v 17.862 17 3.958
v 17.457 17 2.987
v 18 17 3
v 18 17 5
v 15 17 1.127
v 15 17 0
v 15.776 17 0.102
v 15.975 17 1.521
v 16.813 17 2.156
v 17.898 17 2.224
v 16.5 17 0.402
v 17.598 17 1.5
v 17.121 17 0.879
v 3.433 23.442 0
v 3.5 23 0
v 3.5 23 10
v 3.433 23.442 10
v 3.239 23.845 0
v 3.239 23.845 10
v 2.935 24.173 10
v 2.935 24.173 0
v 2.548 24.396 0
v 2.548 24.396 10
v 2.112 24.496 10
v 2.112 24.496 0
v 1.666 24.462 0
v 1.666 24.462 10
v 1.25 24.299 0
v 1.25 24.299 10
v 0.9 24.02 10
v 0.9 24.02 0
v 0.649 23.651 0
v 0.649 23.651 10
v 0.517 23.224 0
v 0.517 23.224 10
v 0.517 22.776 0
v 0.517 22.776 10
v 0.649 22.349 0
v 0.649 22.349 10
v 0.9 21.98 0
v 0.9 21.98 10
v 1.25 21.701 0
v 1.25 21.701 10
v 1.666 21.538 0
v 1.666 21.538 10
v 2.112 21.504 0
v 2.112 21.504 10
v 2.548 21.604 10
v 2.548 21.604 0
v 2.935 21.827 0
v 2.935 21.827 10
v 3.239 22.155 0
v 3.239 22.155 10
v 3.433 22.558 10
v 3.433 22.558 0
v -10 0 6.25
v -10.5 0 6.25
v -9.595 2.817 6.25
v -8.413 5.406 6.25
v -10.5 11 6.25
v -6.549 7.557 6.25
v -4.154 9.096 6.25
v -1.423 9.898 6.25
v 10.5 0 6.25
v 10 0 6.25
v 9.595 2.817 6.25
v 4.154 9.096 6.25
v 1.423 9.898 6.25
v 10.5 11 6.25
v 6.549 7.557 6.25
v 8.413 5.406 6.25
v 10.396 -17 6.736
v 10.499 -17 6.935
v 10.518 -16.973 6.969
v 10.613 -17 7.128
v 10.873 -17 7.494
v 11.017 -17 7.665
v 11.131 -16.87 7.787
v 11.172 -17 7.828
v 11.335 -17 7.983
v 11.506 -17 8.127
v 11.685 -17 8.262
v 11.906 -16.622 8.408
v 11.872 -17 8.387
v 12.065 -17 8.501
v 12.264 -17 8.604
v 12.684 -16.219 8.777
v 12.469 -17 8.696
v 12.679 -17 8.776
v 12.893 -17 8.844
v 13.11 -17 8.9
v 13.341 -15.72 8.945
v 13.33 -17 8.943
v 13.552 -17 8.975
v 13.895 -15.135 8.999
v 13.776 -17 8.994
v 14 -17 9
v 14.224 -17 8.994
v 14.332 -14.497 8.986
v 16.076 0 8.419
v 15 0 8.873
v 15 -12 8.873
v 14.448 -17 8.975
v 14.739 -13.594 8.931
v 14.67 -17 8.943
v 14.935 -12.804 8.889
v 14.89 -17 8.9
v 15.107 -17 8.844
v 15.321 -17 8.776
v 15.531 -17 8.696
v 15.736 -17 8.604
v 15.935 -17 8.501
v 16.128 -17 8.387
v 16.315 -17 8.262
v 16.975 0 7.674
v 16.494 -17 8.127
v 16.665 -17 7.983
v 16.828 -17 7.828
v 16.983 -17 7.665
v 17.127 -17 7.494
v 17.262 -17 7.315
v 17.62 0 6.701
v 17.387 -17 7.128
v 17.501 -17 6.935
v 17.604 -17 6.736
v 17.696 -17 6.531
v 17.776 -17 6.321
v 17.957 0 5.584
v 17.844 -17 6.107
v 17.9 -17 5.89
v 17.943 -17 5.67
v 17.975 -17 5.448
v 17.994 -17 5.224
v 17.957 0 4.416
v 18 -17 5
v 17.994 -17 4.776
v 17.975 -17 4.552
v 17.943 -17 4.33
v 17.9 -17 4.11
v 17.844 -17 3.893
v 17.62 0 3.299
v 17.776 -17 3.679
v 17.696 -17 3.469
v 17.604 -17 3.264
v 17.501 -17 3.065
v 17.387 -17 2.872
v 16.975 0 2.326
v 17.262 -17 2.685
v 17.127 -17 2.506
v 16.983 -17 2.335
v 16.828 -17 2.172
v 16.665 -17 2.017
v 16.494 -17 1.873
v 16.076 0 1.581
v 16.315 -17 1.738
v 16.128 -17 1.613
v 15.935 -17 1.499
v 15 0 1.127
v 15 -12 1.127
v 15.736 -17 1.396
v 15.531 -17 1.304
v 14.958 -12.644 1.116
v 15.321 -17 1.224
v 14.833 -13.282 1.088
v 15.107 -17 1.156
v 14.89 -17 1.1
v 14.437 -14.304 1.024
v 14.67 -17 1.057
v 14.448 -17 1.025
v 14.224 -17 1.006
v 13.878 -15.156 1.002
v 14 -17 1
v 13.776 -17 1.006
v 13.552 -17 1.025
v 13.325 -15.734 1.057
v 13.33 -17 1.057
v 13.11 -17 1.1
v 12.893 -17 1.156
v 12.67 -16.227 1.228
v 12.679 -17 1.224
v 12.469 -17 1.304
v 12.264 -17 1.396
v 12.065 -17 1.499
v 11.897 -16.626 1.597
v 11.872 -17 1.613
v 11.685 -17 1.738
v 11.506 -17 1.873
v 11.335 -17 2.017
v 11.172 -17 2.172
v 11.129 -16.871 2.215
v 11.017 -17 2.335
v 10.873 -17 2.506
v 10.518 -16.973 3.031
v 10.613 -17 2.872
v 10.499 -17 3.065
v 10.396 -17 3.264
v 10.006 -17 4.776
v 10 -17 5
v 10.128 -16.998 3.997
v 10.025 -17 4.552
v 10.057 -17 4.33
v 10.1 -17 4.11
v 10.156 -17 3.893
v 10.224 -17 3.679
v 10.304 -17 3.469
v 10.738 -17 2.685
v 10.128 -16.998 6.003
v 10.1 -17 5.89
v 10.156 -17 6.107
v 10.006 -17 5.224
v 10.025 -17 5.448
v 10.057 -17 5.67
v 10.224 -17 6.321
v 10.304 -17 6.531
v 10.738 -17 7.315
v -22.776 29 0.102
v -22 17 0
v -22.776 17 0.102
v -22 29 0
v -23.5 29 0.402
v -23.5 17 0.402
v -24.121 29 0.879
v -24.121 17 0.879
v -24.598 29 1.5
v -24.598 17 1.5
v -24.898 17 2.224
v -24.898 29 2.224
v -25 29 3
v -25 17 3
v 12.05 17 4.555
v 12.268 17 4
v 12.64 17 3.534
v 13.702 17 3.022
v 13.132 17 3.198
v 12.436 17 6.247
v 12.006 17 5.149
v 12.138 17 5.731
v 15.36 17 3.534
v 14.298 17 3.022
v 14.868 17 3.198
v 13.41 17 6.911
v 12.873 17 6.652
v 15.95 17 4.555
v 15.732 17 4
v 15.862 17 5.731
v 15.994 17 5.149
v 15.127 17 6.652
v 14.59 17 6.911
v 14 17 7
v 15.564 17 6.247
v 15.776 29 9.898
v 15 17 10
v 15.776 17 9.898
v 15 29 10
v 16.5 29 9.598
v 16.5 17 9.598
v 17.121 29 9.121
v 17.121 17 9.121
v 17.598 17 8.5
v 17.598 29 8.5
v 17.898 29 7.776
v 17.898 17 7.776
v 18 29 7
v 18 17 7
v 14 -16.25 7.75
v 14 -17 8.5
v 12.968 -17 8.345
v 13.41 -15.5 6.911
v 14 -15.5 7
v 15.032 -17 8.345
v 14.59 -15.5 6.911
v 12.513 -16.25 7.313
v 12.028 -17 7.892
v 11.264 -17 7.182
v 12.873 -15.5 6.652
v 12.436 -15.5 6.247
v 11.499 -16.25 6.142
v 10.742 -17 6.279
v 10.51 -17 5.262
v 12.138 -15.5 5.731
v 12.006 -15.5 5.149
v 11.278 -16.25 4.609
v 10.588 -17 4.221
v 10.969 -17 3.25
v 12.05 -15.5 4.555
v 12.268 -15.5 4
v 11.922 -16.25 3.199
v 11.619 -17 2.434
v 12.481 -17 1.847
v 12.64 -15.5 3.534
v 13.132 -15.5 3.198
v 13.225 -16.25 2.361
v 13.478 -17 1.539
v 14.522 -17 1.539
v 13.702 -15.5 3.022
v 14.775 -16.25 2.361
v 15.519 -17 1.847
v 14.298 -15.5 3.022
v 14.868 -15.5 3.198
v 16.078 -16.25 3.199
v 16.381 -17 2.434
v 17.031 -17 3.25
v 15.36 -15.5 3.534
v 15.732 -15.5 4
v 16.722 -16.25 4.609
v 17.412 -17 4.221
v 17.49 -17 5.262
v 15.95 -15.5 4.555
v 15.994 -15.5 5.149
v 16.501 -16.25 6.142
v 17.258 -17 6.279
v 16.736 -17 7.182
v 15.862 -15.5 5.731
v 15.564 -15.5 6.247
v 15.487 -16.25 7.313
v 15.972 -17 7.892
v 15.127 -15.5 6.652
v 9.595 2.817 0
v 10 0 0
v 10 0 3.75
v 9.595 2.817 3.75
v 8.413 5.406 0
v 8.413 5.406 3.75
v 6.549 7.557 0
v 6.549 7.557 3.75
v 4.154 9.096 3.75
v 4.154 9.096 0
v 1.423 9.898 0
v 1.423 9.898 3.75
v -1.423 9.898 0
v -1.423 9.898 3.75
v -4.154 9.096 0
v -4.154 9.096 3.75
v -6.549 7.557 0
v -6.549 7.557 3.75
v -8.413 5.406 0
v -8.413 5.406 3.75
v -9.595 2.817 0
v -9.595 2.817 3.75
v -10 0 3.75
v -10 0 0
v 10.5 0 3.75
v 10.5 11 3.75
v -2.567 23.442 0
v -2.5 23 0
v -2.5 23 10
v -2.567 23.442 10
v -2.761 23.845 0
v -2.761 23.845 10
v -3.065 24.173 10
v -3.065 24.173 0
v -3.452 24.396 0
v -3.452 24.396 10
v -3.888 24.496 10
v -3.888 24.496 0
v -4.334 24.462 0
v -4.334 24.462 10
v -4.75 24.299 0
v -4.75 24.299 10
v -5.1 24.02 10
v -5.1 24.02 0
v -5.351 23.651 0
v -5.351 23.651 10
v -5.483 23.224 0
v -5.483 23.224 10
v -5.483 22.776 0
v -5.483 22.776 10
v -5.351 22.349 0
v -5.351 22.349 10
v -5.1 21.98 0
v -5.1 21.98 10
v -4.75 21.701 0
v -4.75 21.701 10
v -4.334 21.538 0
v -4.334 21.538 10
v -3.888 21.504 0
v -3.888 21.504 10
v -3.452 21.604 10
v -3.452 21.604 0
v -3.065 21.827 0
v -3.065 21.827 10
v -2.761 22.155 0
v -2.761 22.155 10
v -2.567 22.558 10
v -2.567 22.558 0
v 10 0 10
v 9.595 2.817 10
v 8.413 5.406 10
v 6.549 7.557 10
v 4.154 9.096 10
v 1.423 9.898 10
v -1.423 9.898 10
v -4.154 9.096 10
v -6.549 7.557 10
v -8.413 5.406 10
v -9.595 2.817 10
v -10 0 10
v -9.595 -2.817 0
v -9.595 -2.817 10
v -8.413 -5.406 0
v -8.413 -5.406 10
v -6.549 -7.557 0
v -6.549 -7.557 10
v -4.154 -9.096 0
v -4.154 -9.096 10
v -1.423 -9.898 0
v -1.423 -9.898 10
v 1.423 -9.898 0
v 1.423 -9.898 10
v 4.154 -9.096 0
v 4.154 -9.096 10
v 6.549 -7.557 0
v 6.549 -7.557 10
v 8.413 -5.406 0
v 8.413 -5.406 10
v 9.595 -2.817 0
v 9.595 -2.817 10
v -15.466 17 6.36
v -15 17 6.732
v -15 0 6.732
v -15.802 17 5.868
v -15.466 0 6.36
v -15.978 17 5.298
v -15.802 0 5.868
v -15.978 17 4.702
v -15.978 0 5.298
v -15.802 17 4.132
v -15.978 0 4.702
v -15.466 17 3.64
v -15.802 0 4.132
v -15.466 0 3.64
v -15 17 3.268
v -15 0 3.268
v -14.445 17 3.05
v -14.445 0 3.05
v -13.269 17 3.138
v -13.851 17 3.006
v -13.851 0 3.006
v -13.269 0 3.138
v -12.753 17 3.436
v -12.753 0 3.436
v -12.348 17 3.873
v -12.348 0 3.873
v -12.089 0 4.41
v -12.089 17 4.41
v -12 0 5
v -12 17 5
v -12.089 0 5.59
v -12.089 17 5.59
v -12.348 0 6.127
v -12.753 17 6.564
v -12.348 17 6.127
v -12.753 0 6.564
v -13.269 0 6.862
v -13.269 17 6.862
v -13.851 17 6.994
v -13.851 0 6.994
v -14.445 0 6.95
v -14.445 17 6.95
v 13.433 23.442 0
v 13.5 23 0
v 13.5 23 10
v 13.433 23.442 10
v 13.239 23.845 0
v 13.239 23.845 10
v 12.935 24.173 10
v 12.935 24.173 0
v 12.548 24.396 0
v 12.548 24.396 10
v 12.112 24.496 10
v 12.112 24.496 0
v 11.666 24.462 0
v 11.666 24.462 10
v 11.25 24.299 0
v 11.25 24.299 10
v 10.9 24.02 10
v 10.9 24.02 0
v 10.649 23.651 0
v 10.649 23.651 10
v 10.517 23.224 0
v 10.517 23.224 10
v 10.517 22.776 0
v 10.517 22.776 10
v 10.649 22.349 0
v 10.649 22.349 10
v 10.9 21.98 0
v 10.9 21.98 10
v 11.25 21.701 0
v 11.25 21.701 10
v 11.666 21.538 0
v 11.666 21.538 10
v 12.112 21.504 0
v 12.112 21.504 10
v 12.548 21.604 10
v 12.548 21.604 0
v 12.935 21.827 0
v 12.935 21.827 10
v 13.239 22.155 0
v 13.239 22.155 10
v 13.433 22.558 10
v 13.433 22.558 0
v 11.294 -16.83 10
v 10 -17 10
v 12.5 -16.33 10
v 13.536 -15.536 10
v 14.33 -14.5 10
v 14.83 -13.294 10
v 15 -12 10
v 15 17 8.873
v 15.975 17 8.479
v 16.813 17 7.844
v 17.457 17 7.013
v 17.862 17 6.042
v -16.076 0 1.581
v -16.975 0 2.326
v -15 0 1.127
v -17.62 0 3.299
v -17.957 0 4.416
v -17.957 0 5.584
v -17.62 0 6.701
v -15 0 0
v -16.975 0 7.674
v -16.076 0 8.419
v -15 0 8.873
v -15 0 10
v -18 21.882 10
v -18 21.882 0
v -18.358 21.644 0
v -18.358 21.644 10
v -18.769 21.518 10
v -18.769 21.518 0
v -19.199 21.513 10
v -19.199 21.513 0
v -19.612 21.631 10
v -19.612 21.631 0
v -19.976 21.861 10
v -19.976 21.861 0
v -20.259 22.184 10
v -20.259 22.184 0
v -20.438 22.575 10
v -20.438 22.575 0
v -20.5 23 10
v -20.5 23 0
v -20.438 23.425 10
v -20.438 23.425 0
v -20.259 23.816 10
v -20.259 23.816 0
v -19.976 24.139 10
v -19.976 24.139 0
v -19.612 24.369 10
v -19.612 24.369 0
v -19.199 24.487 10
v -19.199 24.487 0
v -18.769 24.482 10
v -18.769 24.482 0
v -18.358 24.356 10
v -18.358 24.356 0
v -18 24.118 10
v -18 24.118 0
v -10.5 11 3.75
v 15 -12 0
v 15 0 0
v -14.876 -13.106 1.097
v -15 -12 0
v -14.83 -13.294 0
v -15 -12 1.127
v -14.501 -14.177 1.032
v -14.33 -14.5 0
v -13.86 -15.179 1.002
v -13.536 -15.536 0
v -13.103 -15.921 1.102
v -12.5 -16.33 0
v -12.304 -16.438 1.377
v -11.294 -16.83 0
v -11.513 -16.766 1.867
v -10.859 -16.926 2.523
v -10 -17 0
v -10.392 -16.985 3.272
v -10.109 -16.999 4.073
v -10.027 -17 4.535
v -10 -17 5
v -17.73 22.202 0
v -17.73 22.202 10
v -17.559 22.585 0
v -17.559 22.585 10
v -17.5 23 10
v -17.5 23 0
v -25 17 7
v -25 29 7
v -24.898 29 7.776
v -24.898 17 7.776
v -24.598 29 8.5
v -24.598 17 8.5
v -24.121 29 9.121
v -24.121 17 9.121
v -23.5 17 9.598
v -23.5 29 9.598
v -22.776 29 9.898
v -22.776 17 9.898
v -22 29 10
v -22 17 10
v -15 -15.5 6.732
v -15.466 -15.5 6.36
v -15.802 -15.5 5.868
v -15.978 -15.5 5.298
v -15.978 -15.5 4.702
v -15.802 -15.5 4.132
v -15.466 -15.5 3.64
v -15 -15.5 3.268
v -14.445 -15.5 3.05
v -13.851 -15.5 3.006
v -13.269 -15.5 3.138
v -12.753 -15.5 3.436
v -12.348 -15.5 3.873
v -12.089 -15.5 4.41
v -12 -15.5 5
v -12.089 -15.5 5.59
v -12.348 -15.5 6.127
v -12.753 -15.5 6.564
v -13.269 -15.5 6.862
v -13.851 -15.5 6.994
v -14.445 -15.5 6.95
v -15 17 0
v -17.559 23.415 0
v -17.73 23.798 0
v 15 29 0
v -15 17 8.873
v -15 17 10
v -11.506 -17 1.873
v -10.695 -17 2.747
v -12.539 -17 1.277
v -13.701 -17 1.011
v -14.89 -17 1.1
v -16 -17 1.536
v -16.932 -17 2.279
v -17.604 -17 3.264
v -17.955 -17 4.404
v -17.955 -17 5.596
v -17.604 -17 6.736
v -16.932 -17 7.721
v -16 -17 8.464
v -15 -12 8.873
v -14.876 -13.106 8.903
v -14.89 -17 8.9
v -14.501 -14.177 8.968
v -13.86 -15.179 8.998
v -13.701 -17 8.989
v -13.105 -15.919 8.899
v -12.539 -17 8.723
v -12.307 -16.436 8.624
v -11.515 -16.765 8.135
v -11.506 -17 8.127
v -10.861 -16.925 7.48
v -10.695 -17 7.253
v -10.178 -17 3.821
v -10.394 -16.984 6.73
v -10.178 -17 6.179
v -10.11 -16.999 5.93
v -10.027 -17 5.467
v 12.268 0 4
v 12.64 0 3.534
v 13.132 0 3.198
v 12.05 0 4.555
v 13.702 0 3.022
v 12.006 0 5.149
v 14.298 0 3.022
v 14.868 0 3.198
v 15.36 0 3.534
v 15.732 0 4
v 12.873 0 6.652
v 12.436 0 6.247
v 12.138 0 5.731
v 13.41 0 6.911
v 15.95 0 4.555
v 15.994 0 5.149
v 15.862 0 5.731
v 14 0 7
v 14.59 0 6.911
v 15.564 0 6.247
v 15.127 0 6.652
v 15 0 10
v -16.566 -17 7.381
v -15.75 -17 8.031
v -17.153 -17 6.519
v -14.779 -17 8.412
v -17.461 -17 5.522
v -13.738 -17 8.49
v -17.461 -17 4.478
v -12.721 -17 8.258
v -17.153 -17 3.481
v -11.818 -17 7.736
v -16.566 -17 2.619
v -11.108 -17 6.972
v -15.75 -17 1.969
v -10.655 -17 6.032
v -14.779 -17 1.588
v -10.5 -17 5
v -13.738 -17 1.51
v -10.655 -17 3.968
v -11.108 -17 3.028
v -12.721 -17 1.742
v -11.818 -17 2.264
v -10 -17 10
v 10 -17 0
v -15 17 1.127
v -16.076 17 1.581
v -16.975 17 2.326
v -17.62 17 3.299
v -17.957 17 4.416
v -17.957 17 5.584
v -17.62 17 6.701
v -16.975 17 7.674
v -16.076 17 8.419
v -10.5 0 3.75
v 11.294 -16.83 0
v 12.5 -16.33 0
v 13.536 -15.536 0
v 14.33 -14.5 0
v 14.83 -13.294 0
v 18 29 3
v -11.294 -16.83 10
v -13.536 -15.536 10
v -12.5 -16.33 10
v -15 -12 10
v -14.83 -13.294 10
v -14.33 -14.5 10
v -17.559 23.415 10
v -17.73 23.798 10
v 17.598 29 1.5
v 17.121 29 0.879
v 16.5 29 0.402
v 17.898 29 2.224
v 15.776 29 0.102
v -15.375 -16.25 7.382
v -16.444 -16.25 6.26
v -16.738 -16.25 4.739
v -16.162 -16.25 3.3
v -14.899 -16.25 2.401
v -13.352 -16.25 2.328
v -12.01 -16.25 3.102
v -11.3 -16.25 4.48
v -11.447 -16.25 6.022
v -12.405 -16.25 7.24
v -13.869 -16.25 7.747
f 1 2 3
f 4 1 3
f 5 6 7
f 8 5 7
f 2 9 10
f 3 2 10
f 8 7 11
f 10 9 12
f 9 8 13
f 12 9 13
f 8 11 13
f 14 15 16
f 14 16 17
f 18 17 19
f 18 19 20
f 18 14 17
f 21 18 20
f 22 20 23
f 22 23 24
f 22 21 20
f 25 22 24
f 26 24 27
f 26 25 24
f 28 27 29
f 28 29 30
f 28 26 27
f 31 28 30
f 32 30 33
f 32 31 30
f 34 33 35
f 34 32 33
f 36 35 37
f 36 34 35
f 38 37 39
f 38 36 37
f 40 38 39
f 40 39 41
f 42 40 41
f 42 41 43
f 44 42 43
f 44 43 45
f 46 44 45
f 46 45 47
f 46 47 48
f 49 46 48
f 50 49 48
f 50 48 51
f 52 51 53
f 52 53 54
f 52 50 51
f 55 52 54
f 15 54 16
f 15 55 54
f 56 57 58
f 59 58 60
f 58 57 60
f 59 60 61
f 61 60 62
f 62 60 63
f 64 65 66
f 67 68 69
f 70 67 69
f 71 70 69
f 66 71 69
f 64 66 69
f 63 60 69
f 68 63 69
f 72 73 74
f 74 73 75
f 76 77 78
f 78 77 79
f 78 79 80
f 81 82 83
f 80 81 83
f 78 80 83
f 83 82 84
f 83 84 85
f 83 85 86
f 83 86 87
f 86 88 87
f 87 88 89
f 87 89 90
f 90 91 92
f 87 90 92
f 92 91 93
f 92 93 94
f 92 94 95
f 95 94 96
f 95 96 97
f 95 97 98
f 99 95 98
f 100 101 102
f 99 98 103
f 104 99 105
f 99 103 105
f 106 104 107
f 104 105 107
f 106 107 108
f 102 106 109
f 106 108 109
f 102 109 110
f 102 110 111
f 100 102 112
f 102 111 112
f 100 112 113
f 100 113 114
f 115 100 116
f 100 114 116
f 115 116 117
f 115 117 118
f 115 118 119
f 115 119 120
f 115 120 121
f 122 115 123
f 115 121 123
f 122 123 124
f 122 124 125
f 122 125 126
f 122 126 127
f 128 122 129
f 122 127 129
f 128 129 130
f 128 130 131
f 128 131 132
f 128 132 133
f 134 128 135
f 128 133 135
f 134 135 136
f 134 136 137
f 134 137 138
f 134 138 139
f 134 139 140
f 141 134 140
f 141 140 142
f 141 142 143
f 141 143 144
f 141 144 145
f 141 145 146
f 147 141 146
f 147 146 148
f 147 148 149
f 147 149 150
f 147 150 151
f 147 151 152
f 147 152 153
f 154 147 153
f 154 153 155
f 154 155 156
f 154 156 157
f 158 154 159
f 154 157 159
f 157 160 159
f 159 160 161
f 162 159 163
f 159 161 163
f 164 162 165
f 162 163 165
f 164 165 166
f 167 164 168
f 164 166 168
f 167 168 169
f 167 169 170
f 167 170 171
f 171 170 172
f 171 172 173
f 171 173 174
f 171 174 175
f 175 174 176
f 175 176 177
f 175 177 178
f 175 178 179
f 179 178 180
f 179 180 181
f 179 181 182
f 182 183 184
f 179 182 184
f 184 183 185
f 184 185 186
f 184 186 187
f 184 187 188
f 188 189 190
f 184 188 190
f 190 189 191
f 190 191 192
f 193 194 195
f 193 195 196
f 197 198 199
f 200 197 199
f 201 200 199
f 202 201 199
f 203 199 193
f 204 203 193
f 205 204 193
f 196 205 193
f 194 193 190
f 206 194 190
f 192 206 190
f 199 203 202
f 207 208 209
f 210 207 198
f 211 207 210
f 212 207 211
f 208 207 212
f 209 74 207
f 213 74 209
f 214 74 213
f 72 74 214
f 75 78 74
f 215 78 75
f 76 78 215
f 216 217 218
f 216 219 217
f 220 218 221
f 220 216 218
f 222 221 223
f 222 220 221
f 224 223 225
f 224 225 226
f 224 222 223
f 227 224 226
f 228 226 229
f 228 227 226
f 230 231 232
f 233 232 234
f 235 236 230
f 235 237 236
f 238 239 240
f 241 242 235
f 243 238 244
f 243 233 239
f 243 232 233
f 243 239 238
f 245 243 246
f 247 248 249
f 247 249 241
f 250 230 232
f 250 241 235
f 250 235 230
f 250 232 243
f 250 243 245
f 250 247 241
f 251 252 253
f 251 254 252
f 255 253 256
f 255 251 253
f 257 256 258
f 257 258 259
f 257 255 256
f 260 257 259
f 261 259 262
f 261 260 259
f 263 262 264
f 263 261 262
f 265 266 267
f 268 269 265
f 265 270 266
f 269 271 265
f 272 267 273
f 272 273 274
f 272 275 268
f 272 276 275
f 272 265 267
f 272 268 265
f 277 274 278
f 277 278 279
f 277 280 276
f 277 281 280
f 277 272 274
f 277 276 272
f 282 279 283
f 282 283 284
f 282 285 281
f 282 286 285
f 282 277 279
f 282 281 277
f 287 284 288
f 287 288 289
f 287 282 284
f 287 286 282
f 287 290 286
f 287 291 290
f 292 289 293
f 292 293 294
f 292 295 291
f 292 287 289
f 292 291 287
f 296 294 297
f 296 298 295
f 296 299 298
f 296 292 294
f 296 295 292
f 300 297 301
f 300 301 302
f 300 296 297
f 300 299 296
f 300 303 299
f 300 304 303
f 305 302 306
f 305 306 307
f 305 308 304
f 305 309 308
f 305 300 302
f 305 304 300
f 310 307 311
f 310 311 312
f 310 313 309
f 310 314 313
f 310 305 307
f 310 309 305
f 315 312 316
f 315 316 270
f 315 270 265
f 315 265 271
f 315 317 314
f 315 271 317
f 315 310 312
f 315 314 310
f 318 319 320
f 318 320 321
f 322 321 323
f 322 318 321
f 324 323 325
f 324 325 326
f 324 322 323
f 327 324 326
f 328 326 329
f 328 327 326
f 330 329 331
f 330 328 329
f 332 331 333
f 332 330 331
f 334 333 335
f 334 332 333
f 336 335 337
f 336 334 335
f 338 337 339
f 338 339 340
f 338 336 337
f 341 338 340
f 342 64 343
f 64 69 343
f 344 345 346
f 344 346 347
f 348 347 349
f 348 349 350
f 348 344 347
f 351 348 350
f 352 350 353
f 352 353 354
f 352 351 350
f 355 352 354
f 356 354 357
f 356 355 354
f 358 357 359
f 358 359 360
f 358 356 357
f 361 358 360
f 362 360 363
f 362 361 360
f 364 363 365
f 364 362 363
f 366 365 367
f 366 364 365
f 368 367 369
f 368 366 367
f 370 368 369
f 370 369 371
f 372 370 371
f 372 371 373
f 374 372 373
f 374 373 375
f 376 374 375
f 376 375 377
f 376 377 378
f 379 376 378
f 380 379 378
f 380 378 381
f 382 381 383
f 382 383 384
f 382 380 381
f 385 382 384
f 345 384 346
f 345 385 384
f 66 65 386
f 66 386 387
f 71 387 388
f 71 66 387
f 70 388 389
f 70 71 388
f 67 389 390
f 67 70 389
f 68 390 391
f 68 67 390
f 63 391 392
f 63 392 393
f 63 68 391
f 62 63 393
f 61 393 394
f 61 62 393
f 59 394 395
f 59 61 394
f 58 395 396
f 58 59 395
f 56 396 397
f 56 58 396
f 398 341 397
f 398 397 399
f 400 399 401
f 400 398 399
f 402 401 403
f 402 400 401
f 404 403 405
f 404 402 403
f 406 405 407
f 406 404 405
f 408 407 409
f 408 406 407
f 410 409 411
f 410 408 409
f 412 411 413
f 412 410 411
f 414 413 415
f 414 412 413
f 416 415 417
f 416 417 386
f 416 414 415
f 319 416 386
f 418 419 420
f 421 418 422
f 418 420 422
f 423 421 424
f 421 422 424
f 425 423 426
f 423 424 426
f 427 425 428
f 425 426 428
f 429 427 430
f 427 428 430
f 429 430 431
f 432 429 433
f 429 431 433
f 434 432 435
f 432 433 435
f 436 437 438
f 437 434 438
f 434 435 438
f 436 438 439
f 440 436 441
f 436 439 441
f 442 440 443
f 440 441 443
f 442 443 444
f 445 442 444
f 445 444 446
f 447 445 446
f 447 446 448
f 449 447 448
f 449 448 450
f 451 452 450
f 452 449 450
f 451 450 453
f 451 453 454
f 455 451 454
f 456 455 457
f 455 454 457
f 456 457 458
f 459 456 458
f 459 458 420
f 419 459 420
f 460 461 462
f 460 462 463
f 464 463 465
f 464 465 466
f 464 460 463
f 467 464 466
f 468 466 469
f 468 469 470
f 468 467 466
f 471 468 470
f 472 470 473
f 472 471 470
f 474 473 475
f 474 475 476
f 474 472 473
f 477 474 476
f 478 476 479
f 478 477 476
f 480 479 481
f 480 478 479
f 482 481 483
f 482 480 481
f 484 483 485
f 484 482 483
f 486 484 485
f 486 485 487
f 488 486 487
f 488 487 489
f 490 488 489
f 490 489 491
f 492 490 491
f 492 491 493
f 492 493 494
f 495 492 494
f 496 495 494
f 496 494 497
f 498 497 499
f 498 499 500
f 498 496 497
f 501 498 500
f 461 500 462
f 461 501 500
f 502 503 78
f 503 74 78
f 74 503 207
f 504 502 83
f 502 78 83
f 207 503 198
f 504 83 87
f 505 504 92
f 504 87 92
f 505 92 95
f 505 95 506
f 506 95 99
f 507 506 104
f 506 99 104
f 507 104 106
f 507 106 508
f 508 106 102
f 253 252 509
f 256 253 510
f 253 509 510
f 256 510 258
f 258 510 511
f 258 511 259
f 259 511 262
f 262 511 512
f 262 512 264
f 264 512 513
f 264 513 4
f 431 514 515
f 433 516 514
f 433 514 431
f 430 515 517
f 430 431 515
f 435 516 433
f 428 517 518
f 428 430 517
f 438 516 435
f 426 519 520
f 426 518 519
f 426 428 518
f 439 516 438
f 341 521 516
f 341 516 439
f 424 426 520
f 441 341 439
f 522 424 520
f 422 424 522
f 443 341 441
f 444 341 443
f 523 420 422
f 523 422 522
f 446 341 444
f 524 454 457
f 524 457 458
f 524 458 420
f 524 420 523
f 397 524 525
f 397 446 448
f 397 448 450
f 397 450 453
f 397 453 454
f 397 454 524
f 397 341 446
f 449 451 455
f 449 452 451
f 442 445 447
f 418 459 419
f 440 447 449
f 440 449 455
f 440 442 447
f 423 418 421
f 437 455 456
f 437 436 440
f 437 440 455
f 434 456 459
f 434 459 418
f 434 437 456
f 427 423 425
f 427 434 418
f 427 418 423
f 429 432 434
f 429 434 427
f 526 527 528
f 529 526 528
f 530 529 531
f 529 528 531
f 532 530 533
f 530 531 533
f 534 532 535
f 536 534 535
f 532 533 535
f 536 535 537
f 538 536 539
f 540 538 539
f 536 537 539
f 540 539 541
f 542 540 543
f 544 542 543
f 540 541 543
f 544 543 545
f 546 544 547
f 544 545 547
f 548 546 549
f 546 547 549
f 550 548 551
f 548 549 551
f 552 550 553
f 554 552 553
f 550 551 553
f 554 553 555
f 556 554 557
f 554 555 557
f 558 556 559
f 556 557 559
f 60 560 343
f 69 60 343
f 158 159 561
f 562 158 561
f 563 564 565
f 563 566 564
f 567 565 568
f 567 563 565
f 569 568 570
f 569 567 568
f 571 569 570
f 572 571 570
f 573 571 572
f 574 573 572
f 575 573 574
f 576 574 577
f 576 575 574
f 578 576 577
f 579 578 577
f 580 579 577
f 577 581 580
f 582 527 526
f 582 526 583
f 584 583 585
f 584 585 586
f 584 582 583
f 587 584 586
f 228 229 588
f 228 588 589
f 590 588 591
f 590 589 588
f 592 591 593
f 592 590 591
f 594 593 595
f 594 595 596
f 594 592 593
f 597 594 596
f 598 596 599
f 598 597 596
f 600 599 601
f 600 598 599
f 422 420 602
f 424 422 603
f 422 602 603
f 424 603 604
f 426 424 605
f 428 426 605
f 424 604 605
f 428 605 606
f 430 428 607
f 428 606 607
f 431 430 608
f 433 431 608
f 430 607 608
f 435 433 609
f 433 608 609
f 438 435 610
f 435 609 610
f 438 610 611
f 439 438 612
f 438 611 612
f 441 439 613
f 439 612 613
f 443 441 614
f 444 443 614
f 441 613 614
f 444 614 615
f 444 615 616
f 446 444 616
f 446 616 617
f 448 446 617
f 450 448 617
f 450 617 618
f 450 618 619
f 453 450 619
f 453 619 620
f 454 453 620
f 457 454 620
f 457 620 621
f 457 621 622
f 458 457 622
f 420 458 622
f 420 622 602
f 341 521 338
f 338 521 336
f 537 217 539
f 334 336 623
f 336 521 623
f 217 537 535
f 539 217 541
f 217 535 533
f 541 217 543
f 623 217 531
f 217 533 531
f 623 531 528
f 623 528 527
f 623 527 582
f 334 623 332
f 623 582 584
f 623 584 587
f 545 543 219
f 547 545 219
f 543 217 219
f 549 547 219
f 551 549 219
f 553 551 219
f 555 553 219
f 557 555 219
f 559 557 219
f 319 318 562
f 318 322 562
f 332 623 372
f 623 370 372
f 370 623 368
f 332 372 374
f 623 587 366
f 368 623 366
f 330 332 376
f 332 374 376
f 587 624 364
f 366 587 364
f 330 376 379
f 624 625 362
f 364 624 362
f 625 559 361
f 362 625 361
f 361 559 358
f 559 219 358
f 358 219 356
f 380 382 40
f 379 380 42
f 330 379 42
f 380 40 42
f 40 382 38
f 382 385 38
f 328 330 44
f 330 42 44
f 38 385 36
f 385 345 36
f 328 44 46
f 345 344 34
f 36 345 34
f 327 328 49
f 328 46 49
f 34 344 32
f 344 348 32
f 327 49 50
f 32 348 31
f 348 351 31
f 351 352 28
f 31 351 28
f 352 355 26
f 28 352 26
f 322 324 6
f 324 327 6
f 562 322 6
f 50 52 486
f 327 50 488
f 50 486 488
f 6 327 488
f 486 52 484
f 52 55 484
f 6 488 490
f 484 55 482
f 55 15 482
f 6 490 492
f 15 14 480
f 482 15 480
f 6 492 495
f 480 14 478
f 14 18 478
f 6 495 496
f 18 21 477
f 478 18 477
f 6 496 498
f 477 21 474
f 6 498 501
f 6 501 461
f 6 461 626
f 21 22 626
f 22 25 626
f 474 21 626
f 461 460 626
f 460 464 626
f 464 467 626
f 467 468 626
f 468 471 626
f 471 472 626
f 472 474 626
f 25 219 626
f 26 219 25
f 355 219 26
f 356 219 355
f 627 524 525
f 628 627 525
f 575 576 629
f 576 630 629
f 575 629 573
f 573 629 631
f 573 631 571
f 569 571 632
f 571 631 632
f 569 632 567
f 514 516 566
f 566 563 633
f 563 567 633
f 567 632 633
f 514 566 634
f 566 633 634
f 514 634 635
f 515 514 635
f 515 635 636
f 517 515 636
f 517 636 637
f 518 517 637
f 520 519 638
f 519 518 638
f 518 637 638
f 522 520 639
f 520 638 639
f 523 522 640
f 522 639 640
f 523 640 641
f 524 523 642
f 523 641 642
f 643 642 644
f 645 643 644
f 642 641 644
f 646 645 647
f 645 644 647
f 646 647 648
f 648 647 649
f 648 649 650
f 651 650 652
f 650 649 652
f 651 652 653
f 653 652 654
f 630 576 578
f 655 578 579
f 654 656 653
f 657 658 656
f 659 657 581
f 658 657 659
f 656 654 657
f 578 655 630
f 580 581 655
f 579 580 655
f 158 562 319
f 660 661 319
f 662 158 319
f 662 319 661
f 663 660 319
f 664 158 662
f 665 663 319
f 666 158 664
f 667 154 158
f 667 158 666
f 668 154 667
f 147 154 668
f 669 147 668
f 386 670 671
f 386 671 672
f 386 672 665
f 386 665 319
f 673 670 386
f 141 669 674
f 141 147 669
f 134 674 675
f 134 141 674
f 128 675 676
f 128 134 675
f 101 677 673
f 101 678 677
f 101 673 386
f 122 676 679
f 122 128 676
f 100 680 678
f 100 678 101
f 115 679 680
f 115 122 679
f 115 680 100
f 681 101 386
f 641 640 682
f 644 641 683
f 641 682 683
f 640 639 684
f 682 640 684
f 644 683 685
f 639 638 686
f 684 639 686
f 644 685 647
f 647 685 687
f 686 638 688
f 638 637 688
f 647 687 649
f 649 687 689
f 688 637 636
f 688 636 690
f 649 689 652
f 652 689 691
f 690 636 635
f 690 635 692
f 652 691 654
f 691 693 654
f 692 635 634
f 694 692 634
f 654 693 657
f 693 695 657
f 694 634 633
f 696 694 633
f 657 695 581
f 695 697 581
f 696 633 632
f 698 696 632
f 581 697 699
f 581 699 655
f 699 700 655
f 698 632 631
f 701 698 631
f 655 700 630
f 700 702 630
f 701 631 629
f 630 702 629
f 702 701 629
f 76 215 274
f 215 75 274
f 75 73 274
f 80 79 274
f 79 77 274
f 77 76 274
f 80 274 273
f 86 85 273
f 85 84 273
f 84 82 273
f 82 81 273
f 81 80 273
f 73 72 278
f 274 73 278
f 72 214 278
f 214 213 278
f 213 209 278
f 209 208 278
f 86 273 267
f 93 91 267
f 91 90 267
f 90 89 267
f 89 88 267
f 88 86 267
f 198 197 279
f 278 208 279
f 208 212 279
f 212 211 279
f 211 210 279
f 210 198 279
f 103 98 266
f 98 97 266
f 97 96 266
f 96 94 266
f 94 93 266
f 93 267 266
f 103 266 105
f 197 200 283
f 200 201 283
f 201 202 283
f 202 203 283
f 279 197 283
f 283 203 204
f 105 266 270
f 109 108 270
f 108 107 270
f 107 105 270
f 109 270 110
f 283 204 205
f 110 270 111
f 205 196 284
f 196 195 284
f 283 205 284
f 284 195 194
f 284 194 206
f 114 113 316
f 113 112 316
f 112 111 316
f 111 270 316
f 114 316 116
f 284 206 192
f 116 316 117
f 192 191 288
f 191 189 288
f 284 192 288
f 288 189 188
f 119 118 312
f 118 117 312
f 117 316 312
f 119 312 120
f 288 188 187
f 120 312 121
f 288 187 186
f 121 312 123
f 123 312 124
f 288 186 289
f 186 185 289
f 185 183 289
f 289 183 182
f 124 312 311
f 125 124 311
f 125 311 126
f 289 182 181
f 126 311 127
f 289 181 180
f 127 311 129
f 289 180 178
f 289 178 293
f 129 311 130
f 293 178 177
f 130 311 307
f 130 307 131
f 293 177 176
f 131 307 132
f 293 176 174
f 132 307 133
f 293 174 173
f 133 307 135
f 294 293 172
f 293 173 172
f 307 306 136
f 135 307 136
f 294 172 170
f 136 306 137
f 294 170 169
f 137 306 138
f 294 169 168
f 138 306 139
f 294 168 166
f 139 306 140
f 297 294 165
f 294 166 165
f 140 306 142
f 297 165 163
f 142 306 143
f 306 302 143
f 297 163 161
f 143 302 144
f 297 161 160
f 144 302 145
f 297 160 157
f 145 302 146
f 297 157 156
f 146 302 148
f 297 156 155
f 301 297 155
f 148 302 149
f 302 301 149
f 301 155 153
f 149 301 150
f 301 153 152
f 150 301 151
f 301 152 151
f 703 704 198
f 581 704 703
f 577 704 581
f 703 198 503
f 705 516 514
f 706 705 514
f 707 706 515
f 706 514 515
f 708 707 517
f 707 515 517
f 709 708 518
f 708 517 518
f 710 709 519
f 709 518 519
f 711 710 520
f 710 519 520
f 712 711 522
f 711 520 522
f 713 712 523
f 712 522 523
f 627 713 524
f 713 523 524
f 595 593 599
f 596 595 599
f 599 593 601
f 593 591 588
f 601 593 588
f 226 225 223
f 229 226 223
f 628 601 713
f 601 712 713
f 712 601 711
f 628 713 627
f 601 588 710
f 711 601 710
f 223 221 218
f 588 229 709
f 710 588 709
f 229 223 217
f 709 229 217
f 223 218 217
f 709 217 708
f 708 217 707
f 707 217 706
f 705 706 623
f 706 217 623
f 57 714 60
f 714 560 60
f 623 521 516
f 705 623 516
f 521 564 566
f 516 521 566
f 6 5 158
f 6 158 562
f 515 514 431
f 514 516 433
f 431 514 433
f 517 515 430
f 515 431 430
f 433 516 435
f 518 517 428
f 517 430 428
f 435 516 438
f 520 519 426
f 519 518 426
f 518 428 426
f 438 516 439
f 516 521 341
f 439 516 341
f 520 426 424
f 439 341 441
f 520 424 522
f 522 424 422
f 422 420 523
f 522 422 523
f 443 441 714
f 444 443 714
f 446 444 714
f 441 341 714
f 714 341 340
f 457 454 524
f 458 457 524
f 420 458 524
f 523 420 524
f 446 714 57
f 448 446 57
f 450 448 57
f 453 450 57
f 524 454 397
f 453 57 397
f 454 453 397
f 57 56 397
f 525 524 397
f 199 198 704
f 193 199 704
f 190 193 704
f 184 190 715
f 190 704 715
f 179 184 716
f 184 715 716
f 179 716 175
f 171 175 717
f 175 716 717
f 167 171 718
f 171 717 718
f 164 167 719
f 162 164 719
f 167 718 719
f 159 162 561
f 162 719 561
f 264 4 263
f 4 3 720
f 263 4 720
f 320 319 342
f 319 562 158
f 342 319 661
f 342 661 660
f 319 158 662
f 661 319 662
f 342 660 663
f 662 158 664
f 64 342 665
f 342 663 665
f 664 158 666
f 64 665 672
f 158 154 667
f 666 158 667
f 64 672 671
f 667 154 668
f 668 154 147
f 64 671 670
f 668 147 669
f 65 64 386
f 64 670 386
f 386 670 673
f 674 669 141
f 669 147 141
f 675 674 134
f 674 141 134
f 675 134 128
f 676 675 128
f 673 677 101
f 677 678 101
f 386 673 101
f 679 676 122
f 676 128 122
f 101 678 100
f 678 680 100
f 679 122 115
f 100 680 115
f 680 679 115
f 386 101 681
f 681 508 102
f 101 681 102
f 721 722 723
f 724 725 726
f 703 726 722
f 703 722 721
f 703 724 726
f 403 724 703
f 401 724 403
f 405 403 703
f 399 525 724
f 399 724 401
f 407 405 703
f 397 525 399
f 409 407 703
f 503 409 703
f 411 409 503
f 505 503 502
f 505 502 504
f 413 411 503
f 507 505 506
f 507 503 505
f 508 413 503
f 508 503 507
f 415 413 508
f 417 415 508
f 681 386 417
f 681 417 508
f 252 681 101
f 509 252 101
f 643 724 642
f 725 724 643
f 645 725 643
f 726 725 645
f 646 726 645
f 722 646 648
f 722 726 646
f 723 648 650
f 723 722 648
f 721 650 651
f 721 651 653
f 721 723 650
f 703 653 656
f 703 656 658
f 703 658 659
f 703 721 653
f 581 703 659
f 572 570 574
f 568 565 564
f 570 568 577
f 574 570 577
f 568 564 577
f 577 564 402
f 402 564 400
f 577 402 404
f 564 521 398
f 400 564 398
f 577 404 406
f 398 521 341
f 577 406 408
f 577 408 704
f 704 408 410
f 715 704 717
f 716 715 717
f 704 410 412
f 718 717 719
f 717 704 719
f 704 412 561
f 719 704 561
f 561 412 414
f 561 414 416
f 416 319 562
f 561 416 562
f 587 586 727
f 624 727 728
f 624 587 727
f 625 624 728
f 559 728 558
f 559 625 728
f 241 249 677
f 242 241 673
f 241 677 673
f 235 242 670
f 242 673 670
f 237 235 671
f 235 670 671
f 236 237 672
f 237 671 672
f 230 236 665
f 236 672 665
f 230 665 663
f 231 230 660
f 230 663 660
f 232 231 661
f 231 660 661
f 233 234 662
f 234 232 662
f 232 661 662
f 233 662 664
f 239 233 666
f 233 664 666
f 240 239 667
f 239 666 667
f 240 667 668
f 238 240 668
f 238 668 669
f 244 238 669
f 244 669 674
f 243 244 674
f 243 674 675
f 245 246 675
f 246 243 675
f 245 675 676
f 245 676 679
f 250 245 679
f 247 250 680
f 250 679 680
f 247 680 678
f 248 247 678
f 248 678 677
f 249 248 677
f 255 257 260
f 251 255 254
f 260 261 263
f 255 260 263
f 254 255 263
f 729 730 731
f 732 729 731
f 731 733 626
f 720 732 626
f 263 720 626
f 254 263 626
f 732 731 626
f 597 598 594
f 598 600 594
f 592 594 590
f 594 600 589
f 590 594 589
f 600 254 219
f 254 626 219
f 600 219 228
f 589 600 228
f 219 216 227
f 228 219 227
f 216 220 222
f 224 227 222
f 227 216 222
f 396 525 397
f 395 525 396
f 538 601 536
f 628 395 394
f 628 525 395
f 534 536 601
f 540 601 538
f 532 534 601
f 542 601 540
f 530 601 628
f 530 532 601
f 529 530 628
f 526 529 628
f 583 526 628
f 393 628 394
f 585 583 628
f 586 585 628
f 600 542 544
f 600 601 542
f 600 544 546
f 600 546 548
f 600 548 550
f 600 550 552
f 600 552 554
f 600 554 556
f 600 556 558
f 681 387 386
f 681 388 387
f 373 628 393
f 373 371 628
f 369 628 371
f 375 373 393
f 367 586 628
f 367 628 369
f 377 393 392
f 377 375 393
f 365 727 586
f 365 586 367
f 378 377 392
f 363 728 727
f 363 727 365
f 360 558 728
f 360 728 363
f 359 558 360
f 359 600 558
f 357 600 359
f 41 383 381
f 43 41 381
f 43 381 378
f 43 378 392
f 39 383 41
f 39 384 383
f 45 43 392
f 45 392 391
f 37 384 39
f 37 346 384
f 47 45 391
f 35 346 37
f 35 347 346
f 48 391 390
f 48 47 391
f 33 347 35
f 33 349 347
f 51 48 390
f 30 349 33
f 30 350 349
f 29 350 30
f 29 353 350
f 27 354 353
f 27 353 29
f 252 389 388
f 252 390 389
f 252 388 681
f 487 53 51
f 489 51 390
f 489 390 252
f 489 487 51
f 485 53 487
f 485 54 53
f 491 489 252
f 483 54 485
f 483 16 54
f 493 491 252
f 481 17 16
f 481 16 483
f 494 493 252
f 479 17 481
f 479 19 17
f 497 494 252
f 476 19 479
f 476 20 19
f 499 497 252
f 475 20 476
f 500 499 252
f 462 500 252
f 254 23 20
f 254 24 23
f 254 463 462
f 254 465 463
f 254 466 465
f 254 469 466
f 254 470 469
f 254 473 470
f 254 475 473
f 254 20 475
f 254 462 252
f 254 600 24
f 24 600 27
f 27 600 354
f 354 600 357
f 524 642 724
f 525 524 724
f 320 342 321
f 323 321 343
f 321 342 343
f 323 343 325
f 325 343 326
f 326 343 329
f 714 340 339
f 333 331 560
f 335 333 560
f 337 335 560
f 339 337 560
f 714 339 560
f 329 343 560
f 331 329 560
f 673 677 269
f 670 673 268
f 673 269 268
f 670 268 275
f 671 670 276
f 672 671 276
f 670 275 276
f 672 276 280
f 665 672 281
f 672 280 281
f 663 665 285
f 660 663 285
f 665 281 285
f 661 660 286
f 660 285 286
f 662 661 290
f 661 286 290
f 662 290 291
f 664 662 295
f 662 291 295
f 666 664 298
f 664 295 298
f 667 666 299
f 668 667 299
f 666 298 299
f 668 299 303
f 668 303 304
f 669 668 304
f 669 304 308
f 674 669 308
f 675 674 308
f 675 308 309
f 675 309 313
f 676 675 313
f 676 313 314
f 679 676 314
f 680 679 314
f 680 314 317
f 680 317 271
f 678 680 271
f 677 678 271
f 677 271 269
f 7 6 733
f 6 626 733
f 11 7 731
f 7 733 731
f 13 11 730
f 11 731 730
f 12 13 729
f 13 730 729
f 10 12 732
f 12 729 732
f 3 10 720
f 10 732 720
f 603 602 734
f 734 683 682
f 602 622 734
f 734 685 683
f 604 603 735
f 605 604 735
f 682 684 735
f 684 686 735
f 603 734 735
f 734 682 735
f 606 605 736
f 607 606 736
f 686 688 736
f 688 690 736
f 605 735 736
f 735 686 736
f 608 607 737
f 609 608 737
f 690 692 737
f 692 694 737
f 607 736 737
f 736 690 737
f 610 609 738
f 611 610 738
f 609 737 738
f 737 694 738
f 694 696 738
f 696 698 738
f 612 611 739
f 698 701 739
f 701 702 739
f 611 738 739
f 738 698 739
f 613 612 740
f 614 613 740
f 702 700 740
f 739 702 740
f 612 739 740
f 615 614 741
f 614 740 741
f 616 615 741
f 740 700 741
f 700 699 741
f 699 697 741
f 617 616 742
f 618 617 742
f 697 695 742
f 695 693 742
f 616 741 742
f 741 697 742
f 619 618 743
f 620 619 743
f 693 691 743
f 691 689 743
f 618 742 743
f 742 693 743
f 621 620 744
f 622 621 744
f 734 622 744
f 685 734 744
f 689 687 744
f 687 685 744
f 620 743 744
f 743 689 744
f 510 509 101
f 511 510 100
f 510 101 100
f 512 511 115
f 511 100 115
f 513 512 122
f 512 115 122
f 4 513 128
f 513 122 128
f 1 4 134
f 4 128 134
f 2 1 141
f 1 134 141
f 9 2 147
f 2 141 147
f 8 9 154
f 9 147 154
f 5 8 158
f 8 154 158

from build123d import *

# Parameters (mm, degrees)
SKETCH1_R           = 10.000000000000004
SKETCH1_R_2         = 1.5000000000000007
SKETCH1_R_3         = 1.5000000000000027
SKETCH1_R_4         = 1.5000000000000024
BOSS_EXTRUDE1_DEPTH = 10
CUT_EXTRUDE1_DEPTH  = 34
CUT_EXTRUDE3_START  = 20
SKETCH3_W           = 0.5
SKETCH3_H           = 2.499999999999996
CUT_EXTRUDE3_DEPTH  = 10
CUT_EXTRUDE4_START  = 20
SKETCH3_3_W         = 0.5
SKETCH3_3_H         = 2.499999999999996
CUT_EXTRUDE4_DEPTH  = 1
FILLET1_R           = 5
CHAMFER1_SIZE       = 1.5
BOSS_EXTRUDE2_REACH = 37.567
SKETCH5_W           = 36
SKETCH5_H           = 12.000000000000004
SKETCH5_R           = 1.5000000000000024
SKETCH5_R_2         = 1.500000000000002
SKETCH5_R_3         = 1.5
CUT_EXTRUDE6_DEPTH  = 12
BOSS_EXTRUDE3_START = -10
SKETCH7_R           = 1.5000000000000215
BOSS_EXTRUDE3_DEPTH = 10
CUT_EXTRUDE7_START  = -10
SKETCH8_R           = 1.5000000000000042
SKETCH8_W           = 26.999999999999982
SKETCH8_H           = 12.000000000000004
CUT_EXTRUDE7_DEPTH  = 10
FILLET2_R           = 3


with BuildPart() as part:
    # Sketch1 → Boss-Extrude1 (new body)
    with BuildSketch(Plane.XY):
        with BuildLine():
            ThreePointArc((7.0000000000000355, 26.31662479035534), (3.3722813232688944, 28.84096258931757), (-1.0000000000002711, 28.196152422706483))
            ThreePointArc((-1.0000000000002185, 28.196152422706756), (-7.000000000000114, 28.19615242270657), (-10.000000000000007, 23))
            Line((-10.000000000000005, 23), (-10.000000000000005, 17))
            Line((-10.000000000000004, 17), (-18.000000000000004, 17))
            Line((-18.000000000000004, 17), (-18.000000000000004, -17))
            Line((-18.000000000000004, -17), (17.999999999999996, -17))
            Line((17.999999999999996, -17), (17.999999999999996, 23))
            ThreePointArc((17.999999999999996, 23), (13.73205080756885, 28.744562646538036), (6.999999999999968, 26.316624790355363))
        make_face()
        Circle(SKETCH1_R, mode=Mode.SUBTRACT)
        with Locations((-4.0000000000000036, 23)):
            Circle(SKETCH1_R_2, mode=Mode.SUBTRACT)
        with Locations((1.9999999999999956, 23)):
            Circle(SKETCH1_R_3, mode=Mode.SUBTRACT)
        with Locations((11.999999999999995, 23)):
            Circle(SKETCH1_R_4, mode=Mode.SUBTRACT)
    extrude(amount=BOSS_EXTRUDE1_DEPTH)

    # Sketch2 → Cut-Extrude1 (cut)
    with BuildSketch(Plane.XZ.offset(17)):
        with BuildLine():
            Line((-14.000000000000002, 6.999999999999998), (-14.000000000000002, 2.9999999999999996))
            ThreePointArc((-13.999999999999972, 2.9999999999999996), (-12.585786437626895, 3.5857864376269153), (-12.000000000000002, 4.999999999999998))
            ThreePointArc((-12.000000000000002, 4.999999999999999), (-12.585786437626897, 6.414213562373083), (-13.999999999999972, 6.999999999999998))
        make_face()
        with BuildLine():
            ThreePointArc((-15, 3.267949192431122), (-14.517638090205029, 3.068148347421859), (-13.999999999999972, 2.9999999999999996))
            Line((-14.000000000000002, 2.9999999999999996), (-14.000000000000002, 6.999999999999998))
            ThreePointArc((-13.999999999999972, 6.999999999999998), (-14.517638090205029, 6.931851652578139), (-15.000000000000002, 6.732050807568876))
            Line((-15.000000000000002, 6.732050807568876), (-15.000000000000002, 3.2679491924311215))
        make_face()
        with BuildLine():
            ThreePointArc((-15.000000000000002, 6.732050807568876), (-16, 4.999999999999998), (-15, 3.267949192431122))
            Line((-15.000000000000002, 3.2679491924311215), (-15.000000000000002, 6.732050807568876))
        make_face()
        with BuildLine():
            Line((14.999999999999996, 6.732050807568884), (15, 3.2679491924311357))
            ThreePointArc((15.000000000000002, 3.267949192431135), (15.732050807568875, 4.000000000000011), (15.999999999999996, 5.000000000000009))
            ThreePointArc((15.999999999999996, 5.00000000000001), (15.732050807568875, 6.000000000000008), (15, 6.732050807568885))
        make_face()
        with BuildLine():
            Line((13.999999999999996, 7.000000000000009), (14, 3.0000000000000107))
            ThreePointArc((14.000000000000028, 3.0000000000000107), (14.517638090205056, 3.0681483474218787), (15.000000000000002, 3.267949192431135))
            Line((15, 3.2679491924311357), (14.999999999999996, 6.732050807568884))
            ThreePointArc((15, 6.732050807568885), (14.517638090205056, 6.931851652578141), (14.000000000000027, 7.000000000000009))
        make_face()
        with BuildLine():
            ThreePointArc((14.000000000000027, 7.000000000000009), (12, 5.000000000000009), (14.000000000000028, 3.0000000000000107))
            Line((14, 3.0000000000000107), (13.999999999999996, 7.000000000000009))
        make_face()
        with BuildLine():
            Line((14.999999999999995, 10.00000000000001), (14.999999999999995, 8.87298334620741))
            ThreePointArc((15.000000000000027, 8.872983346207418), (17.162277660168385, 7.449489742783175), (17.999999999999996, 5.00000000000001))
            Line((17.999999999999996, 5.00000000000001), (17.999999999999996, 10))
            Line((17.999999999999996, 10), (14.999999999999995, 10))
        make_face()
        with BuildLine():
            Line((15.000000000000002, 1.1270166537926105), (15.000000000000002, 1.066e-14))
            Line((15.000000000000004, 0), (17.999999999999996, 0))
            Line((17.999999999999996, 0), (17.999999999999996, 5.00000000000001))
            ThreePointArc((17.999999999999996, 5.000000000000009), (17.162277660168385, 2.5505102572168443), (15.000000000000032, 1.1270166537926025))
        make_face()
        with BuildLine():
            Line((-18.000000000000004, 10), (-18.000000000000004, 5))
            ThreePointArc((-18.000000000000004, 5), (-17.16227766016838, 7.449489742783178), (-15.000000000000004, 8.872983346207416))
            Line((-15.000000000000002, 8.872983346207416), (-15.000000000000002, 10))
            Line((-15.000000000000004, 10), (-18.000000000000004, 10))
        make_face()
        with BuildLine():
            Line((-18.000000000000004, 0), (-15.000000000000002, 0))
            Line((-15.000000000000002, 0), (-15.000000000000002, 1.127016653792582))
            ThreePointArc((-15.000000000000004, 1.1270166537925816), (-17.16227766016838, 2.5505102572168212), (-18.000000000000004, 5))
            Line((-18.000000000000004, 5), (-18.000000000000004, 0))
        make_face()
    extrude(amount=-CUT_EXTRUDE1_DEPTH, mode=Mode.SUBTRACT)

    # Sketch3 → Cut-Extrude3 (cut)
    with BuildSketch(Plane(origin=(0, -10.000000000000002, 0), x_dir=(1, 0, 0), z_dir=(0, 1, 0)).offset(CUT_EXTRUDE3_START)):
        Polygon((10.000000000000002, -6.2499999999999964), (10.000000000000002, -3.7500000000000004), (-8.662112306558027, -3.7500000000000004), (-8.662112306558027, -6.250000000000001), align=None)
        Polygon((-8.662112306558027, -3.7500000000000004), (-10.000000000000002, -3.7500000000000004), (-10, -6.250000000000003), (-8.662112306558027, -6.250000000000002), align=None)
        Polygon((-10, -6.250000000000003), (-10.000000000000002, -3.7500000000000004), (-10.5, -3.7500000000000004), (-10.5, -6.250000000000002), align=None)
        with Locations((10.250000000000002, -4.999999999999998)):
            Rectangle(SKETCH3_W, SKETCH3_H)
    extrude(amount=-CUT_EXTRUDE3_DEPTH, mode=Mode.SUBTRACT)

    # Sketch3_3 → Cut-Extrude4 (cut)
    with BuildSketch(Plane(origin=(0, -10.000000000000002, 0), x_dir=(1, 0, 0), z_dir=(0, 1, 0)).offset(CUT_EXTRUDE4_START)):
        Polygon((10.000000000000002, -6.2499999999999964), (10.000000000000002, -3.7500000000000004), (-8.662112306558027, -3.7500000000000004), (-8.662112306558027, -6.250000000000001), align=None)
        Polygon((-8.662112306558027, -3.7500000000000004), (-10.000000000000002, -3.7500000000000004), (-10, -6.250000000000003), (-8.662112306558027, -6.250000000000002), align=None)
        Polygon((-10, -6.250000000000003), (-10.000000000000002, -3.7500000000000004), (-10.5, -3.7500000000000004), (-10.5, -6.250000000000002), align=None)
        with Locations((10.250000000000002, -4.999999999999998)):
            Rectangle(SKETCH3_3_W, SKETCH3_3_H)
    extrude(amount=CUT_EXTRUDE4_DEPTH, mode=Mode.SUBTRACT)

    # Fillet1
    fillet1_edges = [part.edges().sort_by_distance(p)[0] for p in [
        (-15.000000000000002, -17, 0.563508326896291),
        (14.999999999999995, -17, 9.43649167310371),
        (15.000000000000002, -17, 0.5635083268963106),
        (-15.000000000000002, -17, 9.436491673103708),
    ]]
    fillet(fillet1_edges, radius=FILLET1_R)

    # Chamfer1
    chamfer1_edges = [part.edges().sort_by_distance(p)[0] for p in [
        (13.999999999999972, -17, 7.00000000000001),
        (-13.000000000000005, -17, 3.2679491924311277),
    ]]
    chamfer(chamfer1_edges, length=CHAMFER1_SIZE)


with BuildPart() as body_2:
    # Split1: the piece on the far side of the plane
    add(part.part)
    split(bisect_by=Plane.ZX, keep=Keep.BOTTOM)


with BuildPart() as part_1:
    add(part.part)

    # Split1
    split(bisect_by=Plane.ZX, keep=Keep.TOP)

    # Boss-Extrude2: up to this face of the body (flat: up to its plane)
    boss_extrude2_end = Plane(part_1.part.faces().sort_by_distance((1.800705517, 15.88757201, 10))[0])
    # Sketch5 → Boss-Extrude2 (add, up to the picked face)
    with BuildSketch(Plane(origin=(0, 0, 0), x_dir=(-1, 0, 0), z_dir=(0, 0, -1)), mode=Mode.PRIVATE) as boss_extrude2_sk1:
        with Locations((3.55e-15, 23)):
            Rectangle(SKETCH5_W, SKETCH5_H)
        with Locations(Location((-11.999999999999995, 23, 0), (0, 0, 180))):
            Circle(SKETCH5_R, mode=Mode.SUBTRACT)
        with Locations(Location((-1.999999999999995, 23, 0), (0, 0, 180))):
            Circle(SKETCH5_R_2, mode=Mode.SUBTRACT)
        with Locations(Location((4.000000000000005, 23, 0), (0, 0, 180))):
            Circle(SKETCH5_R_3, mode=Mode.SUBTRACT)
    boss_extrude2_tool1 = split(extrude(boss_extrude2_sk1.sketch, amount=-BOSS_EXTRUDE2_REACH, mode=Mode.PRIVATE), bisect_by=boss_extrude2_end, keep=Keep.BOTH, mode=Mode.PRIVATE)
    add(boss_extrude2_tool1.solids().sort_by(Axis((-0.172071, 23, 0), (0, 0, 1)))[0])

    # Sketch6 → Cut-Extrude6 (cut)
    with BuildSketch(Plane.XZ.offset(-17)):
        with BuildLine():
            Line((17.999999999999996, 10), (14.999999999999995, 10))
            Line((14.999999999999995, 10), (14.999999999999995, 8.872983346207427))
            ThreePointArc((14.999999999999995, 8.872983346207427), (17.162277660168375, 7.449489742783188), (17.999999999999996, 5.00000000000001))
            Line((17.999999999999996, 5.00000000000001), (17.999999999999996, 10))
        make_face()
        with BuildLine():
            Line((17.999999999999996, 0), (17.999999999999996, 5.00000000000001))
            ThreePointArc((17.999999999999996, 5.00000000000001), (17.162277660168378, 2.550510257216833), (15.000000000000002, 1.1270166537925945))
            Line((15.000000000000002, 1.127016653792595), (15.000000000000002, 0))
            Line((15.000000000000002, 0), (17.999999999999996, 0))
        make_face()
        with BuildLine():
            Line((-15, 10.000000000000002), (-18.000000000000004, 10.000000000000002))
            Line((-18.000000000000004, 10.000000000000002), (-18.000000000000004, 4.999999999999997))
            ThreePointArc((-18.000000000000004, 4.999999999999997), (-17.162277660168385, 7.449489742783179), (-15.000000000000002, 8.872983346207418))
            Line((-15.000000000000002, 8.872983346207418), (-15, 10.000000000000002))
        make_face()
        with BuildLine():
            ThreePointArc((-15.000000000000002, 1.1270166537925816), (-17.16227766016838, 2.55051025721682), (-18.000000000000004, 4.999999999999997))
            Line((-18.000000000000004, 4.999999999999997), (-18.000000000000004, 0))
            Line((-18.000000000000004, 0), (-15, 0))
            Line((-15, 0), (-15.000000000000002, 1.1270166537925814))
        make_face()
    extrude(amount=-CUT_EXTRUDE6_DEPTH, mode=Mode.SUBTRACT)

    # Sketch7 → Boss-Extrude3 (add)
    # profile 1 of 2: a face of its own
    with BuildSketch(Plane.XY.offset(10).offset(BOSS_EXTRUDE3_START)):
        Polygon((-15.000000000000002, 29), (-51.99999999999998, 29.000000000000014), (-51.99999999999998, 17.000000000000014), (-15.000000000000007, 17.000000000000004), align=None)
        with BuildLine():
            ThreePointArc((-18.000000000000018, 21.881966011250086), (-20.500000000000007, 23), (-18.000000000000018, 24.118033988749914))
            Line((-18.000000000000004, 24.118033988749918), (-18.000000000000004, 21.881966011250082))
        make_face(mode=Mode.SUBTRACT)
        with Locations((-45.999999999999986, 23)):
            Circle(SKETCH7_R, mode=Mode.SUBTRACT)
    # profile 2 of 2: a face of its own
    with BuildSketch(Plane.XY.offset(10).offset(BOSS_EXTRUDE3_START)):
        Polygon((18.000000000000004, 29), (14.999999999999996, 29), (14.999999999999995, 17), (18.000000000000004, 17), align=None)
    extrude(amount=BOSS_EXTRUDE3_DEPTH)

    # Sketch8 → Cut-Extrude7 (cut)
    with BuildSketch(Plane.XY.offset(10).offset(CUT_EXTRUDE7_START)):
        with Locations((-19.000000000000004, 23)):
            Circle(SKETCH8_R)
        with Locations((-38.49999999999999, 23.000000000000007)):
            Rectangle(SKETCH8_W, SKETCH8_H)
    extrude(amount=CUT_EXTRUDE7_DEPTH, mode=Mode.SUBTRACT)

    # Fillet2
    fillet2_edges = [part_1.edges().sort_by_distance(p)[0] for p in [
        (18.000000000000004, 23, 0),
        (18.000000000000004, 23, 10),
        (-25, 23.00000000000001, 0),
        (-25, 23.00000000000001, 10),
    ]]
    fillet(fillet2_edges, radius=FILLET2_R)


solid = Compound([body_2.part, part_1.part])
